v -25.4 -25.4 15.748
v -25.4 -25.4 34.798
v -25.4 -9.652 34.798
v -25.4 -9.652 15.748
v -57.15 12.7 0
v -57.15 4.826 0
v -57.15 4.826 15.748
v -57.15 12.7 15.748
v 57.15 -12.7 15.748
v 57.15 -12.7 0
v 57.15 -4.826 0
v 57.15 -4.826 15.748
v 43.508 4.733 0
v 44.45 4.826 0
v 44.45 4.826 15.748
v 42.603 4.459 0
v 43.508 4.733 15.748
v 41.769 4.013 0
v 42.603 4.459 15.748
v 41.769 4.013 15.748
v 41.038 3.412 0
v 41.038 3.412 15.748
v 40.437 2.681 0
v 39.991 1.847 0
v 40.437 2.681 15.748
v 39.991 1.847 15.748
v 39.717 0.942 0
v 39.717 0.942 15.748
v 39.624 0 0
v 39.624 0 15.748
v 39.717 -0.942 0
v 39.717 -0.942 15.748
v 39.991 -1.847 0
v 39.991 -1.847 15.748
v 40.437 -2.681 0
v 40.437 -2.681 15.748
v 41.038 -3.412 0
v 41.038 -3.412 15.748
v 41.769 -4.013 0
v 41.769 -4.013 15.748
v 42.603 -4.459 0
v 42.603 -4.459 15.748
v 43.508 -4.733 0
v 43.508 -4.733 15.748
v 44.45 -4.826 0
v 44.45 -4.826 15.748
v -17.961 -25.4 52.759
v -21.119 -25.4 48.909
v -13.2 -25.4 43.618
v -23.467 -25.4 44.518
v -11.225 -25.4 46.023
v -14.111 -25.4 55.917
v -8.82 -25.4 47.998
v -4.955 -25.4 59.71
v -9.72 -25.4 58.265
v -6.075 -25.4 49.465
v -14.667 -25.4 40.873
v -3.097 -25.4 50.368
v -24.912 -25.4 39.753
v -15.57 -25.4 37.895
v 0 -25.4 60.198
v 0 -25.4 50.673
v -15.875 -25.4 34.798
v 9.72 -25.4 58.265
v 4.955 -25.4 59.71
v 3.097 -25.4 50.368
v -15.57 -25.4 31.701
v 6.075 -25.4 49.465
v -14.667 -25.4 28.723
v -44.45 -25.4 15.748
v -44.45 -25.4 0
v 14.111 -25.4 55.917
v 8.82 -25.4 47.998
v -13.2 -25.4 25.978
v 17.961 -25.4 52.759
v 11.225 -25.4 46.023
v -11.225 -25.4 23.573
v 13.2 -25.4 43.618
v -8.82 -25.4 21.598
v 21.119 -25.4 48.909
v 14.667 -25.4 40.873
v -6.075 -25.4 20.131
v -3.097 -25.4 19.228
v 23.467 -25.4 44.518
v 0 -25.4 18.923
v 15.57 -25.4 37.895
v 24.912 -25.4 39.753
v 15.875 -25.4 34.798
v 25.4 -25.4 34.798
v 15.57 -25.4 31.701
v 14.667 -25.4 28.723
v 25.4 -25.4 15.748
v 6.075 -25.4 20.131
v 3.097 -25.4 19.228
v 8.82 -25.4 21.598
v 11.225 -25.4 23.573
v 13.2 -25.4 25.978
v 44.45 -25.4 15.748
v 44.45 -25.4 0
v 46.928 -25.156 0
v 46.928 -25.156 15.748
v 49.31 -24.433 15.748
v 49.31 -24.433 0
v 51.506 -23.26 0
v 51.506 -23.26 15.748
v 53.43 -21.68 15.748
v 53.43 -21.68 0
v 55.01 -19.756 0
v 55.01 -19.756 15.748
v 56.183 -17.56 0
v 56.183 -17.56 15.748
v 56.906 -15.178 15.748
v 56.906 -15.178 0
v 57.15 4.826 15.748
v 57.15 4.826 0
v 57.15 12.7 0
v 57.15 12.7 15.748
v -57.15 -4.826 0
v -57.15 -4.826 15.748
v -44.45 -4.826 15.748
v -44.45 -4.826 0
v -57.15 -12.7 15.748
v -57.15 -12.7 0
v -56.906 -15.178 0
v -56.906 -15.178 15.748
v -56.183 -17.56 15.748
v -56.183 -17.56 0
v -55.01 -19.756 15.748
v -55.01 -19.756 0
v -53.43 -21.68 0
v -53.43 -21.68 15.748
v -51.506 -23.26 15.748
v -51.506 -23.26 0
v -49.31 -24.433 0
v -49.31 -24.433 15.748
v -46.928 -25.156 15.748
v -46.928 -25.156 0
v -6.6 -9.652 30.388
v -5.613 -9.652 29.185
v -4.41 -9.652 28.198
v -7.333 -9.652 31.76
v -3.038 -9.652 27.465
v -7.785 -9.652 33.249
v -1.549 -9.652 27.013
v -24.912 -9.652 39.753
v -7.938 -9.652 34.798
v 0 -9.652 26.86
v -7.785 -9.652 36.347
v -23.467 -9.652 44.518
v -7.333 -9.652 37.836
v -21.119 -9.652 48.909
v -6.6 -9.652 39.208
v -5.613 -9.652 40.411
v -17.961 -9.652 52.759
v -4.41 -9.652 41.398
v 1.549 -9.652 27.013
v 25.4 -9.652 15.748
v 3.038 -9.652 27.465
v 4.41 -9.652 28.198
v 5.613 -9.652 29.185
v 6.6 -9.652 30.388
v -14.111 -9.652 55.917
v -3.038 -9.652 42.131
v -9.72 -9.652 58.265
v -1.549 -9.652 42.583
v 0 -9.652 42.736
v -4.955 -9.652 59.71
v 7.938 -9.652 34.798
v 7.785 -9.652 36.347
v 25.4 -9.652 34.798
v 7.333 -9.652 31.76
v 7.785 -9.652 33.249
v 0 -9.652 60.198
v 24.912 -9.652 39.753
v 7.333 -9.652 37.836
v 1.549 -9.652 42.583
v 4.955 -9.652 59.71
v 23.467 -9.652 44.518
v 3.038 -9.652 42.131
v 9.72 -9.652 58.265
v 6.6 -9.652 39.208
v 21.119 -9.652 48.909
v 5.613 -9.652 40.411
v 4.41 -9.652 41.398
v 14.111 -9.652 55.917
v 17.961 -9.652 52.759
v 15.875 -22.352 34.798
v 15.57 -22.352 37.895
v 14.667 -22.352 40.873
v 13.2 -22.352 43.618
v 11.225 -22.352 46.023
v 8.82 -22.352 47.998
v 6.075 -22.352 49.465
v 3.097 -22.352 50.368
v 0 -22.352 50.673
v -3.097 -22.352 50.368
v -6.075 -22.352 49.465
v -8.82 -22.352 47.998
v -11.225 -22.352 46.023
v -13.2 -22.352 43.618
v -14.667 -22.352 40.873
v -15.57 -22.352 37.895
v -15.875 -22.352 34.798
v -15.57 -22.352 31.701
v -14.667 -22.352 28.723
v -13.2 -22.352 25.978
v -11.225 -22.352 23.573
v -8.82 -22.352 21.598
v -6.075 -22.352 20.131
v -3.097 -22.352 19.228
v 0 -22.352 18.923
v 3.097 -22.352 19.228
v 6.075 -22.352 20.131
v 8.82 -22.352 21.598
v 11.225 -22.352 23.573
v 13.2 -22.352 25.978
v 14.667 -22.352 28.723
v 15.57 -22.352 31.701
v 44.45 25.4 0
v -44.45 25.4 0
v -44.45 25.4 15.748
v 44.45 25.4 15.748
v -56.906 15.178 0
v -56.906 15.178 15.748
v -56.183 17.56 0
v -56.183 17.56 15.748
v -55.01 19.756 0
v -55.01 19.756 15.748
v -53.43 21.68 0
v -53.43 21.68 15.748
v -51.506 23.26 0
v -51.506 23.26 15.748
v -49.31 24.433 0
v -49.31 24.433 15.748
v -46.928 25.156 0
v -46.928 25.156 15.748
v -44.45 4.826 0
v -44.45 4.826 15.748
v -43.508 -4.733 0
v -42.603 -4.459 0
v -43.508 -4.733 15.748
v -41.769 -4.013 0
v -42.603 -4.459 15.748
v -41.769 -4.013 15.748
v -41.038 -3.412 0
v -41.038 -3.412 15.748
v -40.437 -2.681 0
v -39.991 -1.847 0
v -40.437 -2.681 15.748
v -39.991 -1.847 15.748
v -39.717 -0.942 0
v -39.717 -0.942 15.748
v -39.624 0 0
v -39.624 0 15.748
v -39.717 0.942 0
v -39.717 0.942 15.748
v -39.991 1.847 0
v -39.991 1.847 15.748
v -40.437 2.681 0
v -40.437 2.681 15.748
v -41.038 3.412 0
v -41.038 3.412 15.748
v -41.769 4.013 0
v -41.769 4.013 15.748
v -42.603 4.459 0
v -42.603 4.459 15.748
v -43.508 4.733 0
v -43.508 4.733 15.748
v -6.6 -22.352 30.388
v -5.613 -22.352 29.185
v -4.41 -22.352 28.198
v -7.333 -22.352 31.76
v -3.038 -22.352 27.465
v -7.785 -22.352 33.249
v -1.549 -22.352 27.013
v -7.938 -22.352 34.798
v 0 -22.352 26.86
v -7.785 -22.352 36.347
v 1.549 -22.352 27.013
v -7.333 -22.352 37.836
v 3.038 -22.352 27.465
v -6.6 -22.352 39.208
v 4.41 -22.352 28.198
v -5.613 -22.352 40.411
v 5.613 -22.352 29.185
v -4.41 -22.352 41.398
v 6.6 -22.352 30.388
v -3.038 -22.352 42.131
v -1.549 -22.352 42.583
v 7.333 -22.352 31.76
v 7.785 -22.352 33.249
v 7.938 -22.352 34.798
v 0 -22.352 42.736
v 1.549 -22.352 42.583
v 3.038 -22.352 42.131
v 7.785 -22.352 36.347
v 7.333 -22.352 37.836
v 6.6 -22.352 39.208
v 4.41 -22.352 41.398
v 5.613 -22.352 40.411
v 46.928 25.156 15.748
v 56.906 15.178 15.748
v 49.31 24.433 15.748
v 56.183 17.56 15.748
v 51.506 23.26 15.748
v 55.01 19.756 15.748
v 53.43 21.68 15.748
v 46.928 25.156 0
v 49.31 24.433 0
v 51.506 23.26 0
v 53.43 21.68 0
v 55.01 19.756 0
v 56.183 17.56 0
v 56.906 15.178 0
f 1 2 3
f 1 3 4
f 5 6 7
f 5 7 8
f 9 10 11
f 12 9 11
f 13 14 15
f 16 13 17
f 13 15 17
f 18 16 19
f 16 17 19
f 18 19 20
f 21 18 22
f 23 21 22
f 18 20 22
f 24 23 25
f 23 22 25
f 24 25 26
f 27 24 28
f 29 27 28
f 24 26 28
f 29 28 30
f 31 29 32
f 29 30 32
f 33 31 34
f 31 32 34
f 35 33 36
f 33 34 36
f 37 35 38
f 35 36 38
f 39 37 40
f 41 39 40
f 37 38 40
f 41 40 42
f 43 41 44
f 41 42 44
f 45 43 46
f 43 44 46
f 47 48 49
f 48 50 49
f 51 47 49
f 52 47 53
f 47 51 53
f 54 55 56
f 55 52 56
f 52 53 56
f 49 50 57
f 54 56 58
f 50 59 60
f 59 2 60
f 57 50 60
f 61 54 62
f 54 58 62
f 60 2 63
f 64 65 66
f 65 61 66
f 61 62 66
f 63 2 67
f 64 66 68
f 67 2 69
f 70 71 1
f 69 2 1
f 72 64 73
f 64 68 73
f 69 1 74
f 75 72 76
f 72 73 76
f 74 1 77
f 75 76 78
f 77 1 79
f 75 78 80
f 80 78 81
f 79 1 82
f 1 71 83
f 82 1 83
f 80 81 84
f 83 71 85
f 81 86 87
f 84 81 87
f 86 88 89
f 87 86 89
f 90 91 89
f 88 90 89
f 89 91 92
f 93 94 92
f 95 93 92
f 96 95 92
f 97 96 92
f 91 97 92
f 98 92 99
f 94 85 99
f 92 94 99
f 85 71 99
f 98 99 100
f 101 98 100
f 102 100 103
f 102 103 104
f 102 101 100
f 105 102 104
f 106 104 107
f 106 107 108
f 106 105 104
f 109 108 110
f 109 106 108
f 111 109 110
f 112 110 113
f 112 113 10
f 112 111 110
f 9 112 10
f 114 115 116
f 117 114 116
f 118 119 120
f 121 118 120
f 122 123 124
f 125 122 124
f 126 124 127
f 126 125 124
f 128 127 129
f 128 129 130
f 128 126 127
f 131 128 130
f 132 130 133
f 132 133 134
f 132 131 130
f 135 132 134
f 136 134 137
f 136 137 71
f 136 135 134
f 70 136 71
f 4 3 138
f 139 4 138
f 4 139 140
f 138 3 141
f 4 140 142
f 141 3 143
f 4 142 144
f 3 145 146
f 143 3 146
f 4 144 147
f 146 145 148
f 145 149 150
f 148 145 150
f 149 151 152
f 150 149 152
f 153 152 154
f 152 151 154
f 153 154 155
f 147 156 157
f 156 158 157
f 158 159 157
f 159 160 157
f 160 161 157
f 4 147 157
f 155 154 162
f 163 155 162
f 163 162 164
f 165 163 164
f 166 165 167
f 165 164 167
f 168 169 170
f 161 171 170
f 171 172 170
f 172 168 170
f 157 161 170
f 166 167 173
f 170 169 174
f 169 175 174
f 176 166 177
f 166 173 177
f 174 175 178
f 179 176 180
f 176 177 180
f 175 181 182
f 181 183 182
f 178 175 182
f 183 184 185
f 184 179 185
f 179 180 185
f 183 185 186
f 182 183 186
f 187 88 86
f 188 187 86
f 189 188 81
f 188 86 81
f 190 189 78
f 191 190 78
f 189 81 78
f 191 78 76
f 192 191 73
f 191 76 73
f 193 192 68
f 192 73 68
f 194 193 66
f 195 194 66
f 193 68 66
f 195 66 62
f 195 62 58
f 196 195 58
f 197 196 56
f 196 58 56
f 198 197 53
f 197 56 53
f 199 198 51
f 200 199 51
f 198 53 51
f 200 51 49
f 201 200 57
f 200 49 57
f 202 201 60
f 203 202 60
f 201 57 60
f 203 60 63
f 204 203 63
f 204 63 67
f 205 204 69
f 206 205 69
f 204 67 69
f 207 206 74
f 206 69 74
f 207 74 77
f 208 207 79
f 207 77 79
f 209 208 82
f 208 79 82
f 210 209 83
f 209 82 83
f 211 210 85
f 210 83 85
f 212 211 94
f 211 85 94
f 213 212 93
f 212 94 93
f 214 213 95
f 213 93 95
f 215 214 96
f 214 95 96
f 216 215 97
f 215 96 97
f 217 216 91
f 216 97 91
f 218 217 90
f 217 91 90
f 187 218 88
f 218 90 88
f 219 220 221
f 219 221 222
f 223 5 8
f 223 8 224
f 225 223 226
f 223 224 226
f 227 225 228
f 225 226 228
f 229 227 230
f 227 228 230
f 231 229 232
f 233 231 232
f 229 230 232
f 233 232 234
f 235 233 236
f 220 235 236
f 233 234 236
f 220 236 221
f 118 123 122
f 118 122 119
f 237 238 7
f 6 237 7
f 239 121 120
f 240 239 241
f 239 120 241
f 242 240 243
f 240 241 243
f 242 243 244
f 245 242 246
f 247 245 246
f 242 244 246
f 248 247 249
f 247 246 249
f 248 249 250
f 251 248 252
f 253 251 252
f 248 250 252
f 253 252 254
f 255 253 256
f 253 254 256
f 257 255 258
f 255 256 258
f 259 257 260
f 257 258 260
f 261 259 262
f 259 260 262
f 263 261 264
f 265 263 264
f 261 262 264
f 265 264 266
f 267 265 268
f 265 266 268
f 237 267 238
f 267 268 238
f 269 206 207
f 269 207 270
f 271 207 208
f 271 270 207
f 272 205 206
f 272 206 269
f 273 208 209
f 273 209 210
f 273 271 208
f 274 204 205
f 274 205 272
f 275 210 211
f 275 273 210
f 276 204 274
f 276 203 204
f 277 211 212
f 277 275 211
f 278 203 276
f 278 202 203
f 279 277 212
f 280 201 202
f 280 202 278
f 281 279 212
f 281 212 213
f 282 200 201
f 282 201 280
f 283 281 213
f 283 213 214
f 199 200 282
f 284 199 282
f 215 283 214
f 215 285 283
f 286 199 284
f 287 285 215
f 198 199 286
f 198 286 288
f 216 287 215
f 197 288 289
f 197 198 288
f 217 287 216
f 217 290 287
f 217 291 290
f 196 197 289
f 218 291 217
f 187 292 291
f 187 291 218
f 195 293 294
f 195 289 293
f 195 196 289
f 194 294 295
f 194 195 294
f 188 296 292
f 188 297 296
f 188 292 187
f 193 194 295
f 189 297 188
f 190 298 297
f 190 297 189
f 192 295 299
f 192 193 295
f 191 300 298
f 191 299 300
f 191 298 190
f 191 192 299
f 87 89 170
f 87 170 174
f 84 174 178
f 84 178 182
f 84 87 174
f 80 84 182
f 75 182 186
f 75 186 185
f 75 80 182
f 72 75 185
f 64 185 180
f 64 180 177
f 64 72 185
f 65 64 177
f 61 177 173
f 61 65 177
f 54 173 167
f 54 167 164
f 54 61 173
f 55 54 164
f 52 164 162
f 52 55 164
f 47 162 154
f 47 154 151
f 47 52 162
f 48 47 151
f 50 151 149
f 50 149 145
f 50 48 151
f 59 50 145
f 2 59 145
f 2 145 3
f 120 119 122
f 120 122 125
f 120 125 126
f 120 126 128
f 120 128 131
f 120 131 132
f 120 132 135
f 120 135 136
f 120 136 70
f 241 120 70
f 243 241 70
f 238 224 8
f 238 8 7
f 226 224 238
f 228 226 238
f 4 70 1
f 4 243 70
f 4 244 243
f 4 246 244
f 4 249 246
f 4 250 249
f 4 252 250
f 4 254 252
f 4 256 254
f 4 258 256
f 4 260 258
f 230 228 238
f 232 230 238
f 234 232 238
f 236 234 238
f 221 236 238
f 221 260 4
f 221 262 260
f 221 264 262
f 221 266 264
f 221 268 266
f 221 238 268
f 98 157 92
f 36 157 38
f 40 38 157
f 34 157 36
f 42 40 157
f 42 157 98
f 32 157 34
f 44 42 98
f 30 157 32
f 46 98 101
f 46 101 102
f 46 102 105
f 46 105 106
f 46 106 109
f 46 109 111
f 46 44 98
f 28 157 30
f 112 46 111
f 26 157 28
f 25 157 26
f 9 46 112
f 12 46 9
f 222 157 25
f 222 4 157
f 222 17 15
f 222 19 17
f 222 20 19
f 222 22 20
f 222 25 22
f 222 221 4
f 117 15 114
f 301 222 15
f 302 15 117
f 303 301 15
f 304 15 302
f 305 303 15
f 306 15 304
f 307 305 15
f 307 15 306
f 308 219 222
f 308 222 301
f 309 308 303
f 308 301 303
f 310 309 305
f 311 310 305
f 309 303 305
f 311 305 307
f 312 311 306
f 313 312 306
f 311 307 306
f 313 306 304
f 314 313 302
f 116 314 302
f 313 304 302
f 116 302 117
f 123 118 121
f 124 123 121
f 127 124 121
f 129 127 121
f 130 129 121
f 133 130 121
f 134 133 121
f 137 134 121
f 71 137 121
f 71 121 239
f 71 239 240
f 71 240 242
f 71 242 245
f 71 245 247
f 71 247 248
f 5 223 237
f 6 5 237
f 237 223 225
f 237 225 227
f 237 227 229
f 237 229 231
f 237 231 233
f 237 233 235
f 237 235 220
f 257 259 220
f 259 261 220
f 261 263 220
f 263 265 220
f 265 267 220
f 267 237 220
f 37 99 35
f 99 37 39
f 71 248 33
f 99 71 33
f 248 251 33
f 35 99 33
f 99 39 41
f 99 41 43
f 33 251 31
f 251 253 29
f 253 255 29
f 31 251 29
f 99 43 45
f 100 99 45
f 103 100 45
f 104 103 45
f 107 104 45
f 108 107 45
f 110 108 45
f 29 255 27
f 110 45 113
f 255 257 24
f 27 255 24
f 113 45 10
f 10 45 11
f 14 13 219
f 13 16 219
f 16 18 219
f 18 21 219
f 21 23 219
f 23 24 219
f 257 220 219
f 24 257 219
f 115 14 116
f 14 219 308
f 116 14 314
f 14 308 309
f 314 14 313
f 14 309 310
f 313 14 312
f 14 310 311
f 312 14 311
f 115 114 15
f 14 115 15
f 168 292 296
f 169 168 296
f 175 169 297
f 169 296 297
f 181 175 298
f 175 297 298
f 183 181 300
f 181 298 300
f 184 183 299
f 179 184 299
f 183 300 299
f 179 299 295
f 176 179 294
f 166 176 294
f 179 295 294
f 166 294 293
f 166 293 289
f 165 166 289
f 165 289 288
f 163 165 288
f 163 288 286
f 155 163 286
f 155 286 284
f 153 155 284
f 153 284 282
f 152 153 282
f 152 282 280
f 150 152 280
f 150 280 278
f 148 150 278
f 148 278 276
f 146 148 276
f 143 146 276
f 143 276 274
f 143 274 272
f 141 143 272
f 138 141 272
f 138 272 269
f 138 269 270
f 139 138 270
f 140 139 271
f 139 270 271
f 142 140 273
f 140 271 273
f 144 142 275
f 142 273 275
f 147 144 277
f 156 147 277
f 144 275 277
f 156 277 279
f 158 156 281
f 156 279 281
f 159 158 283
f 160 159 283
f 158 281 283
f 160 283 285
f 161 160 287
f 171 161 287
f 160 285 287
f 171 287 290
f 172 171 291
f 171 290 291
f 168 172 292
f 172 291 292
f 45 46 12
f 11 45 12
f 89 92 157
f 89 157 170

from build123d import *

# Parameters (mm, degrees)
F0_W     = 114.3
F0_H     = 50.8
F1_DEPTH = 15.748
F2_R     = 15.875
F2_R_2   = 7.9375
F3_DEPTH = 15.748
F4_DEPTH = 3.048
F5_DEPTH = 50.801
F7_DEPTH = 15.749
F8_R     = 12.7


with BuildPart() as f1:
    # F0 (on Top) → F1 (new body)
    with BuildSketch(Plane.XY):
        Rectangle(F0_W, F0_H)
    extrude(amount=F1_DEPTH)

    # F2 (on face) → F3 (join)
    with BuildSketch(Plane.XZ.offset(25.4)):
        with BuildLine():
            Line((25.4, 15.748), (25.4, 34.798))
            ThreePointArc((25.4, 34.798), (0, 60.198), (-25.4, 34.798))
            Line((-25.4, 34.798), (-25.4, 15.748))
            Line((-25.4, 15.748), (25.4, 15.748))
        make_face()
        with Locations((0, 34.798)):
            Circle(F2_R, mode=Mode.SUBTRACT)
        with Locations((0, 34.798)):
            Circle(F2_R_2)
        with Locations((0, 34.798)):
            Circle(F2_R)
        with Locations((0, 34.798)):
            Circle(F2_R_2, mode=Mode.SUBTRACT)
    extrude(amount=-F3_DEPTH)

    # F2 (on face) → F4 (cut)
    with BuildSketch(Plane.XZ.offset(25.4)):
        with Locations((0, 34.798)):
            Circle(F2_R)
        with Locations((0, 34.798)):
            Circle(F2_R_2, mode=Mode.SUBTRACT)
    extrude(amount=-F4_DEPTH, mode=Mode.SUBTRACT)

    # F2 (on face) → F5 (cut, through all)
    with BuildSketch(Plane.XZ.offset(25.4)):
        with Locations((0, 34.798)):
            Circle(F2_R_2)
    extrude(amount=-F5_DEPTH, mode=Mode.SUBTRACT)

    # F6 (on face) → F7 (cut, through all)
    with BuildSketch(Plane.XY.offset(15.748)):
        with BuildLine():
            Line((-57.15, -4.826), (-44.45, -4.826))
            ThreePointArc((-44.45, -4.826), (-39.624, 0), (-44.45, 4.826))
            Line((-44.45, 4.826), (-57.15, 4.826))
            Line((-57.15, 4.826), (-57.15, -4.826))
        make_face()
        with BuildLine():
            Line((57.15, -4.826), (57.15, 4.826))
            Line((57.15, 4.826), (44.45, 4.826))
            ThreePointArc((44.45, 4.826), (39.624, 0), (44.45, -4.826))
            Line((44.45, -4.826), (57.15, -4.826))
        make_face()
    extrude(amount=-F7_DEPTH, mode=Mode.SUBTRACT)

    # F8
    f8_edges = [f1.edges().sort_by_distance(p)[0] for p in [
        (57.15, -25.4, 7.874),
        (57.15, 25.4, 7.874),
        (-57.15, -25.4, 7.874),
        (-57.15, 25.4, 7.874),
    ]]
    fillet(f8_edges, radius=F8_R)


solid = f1.part
